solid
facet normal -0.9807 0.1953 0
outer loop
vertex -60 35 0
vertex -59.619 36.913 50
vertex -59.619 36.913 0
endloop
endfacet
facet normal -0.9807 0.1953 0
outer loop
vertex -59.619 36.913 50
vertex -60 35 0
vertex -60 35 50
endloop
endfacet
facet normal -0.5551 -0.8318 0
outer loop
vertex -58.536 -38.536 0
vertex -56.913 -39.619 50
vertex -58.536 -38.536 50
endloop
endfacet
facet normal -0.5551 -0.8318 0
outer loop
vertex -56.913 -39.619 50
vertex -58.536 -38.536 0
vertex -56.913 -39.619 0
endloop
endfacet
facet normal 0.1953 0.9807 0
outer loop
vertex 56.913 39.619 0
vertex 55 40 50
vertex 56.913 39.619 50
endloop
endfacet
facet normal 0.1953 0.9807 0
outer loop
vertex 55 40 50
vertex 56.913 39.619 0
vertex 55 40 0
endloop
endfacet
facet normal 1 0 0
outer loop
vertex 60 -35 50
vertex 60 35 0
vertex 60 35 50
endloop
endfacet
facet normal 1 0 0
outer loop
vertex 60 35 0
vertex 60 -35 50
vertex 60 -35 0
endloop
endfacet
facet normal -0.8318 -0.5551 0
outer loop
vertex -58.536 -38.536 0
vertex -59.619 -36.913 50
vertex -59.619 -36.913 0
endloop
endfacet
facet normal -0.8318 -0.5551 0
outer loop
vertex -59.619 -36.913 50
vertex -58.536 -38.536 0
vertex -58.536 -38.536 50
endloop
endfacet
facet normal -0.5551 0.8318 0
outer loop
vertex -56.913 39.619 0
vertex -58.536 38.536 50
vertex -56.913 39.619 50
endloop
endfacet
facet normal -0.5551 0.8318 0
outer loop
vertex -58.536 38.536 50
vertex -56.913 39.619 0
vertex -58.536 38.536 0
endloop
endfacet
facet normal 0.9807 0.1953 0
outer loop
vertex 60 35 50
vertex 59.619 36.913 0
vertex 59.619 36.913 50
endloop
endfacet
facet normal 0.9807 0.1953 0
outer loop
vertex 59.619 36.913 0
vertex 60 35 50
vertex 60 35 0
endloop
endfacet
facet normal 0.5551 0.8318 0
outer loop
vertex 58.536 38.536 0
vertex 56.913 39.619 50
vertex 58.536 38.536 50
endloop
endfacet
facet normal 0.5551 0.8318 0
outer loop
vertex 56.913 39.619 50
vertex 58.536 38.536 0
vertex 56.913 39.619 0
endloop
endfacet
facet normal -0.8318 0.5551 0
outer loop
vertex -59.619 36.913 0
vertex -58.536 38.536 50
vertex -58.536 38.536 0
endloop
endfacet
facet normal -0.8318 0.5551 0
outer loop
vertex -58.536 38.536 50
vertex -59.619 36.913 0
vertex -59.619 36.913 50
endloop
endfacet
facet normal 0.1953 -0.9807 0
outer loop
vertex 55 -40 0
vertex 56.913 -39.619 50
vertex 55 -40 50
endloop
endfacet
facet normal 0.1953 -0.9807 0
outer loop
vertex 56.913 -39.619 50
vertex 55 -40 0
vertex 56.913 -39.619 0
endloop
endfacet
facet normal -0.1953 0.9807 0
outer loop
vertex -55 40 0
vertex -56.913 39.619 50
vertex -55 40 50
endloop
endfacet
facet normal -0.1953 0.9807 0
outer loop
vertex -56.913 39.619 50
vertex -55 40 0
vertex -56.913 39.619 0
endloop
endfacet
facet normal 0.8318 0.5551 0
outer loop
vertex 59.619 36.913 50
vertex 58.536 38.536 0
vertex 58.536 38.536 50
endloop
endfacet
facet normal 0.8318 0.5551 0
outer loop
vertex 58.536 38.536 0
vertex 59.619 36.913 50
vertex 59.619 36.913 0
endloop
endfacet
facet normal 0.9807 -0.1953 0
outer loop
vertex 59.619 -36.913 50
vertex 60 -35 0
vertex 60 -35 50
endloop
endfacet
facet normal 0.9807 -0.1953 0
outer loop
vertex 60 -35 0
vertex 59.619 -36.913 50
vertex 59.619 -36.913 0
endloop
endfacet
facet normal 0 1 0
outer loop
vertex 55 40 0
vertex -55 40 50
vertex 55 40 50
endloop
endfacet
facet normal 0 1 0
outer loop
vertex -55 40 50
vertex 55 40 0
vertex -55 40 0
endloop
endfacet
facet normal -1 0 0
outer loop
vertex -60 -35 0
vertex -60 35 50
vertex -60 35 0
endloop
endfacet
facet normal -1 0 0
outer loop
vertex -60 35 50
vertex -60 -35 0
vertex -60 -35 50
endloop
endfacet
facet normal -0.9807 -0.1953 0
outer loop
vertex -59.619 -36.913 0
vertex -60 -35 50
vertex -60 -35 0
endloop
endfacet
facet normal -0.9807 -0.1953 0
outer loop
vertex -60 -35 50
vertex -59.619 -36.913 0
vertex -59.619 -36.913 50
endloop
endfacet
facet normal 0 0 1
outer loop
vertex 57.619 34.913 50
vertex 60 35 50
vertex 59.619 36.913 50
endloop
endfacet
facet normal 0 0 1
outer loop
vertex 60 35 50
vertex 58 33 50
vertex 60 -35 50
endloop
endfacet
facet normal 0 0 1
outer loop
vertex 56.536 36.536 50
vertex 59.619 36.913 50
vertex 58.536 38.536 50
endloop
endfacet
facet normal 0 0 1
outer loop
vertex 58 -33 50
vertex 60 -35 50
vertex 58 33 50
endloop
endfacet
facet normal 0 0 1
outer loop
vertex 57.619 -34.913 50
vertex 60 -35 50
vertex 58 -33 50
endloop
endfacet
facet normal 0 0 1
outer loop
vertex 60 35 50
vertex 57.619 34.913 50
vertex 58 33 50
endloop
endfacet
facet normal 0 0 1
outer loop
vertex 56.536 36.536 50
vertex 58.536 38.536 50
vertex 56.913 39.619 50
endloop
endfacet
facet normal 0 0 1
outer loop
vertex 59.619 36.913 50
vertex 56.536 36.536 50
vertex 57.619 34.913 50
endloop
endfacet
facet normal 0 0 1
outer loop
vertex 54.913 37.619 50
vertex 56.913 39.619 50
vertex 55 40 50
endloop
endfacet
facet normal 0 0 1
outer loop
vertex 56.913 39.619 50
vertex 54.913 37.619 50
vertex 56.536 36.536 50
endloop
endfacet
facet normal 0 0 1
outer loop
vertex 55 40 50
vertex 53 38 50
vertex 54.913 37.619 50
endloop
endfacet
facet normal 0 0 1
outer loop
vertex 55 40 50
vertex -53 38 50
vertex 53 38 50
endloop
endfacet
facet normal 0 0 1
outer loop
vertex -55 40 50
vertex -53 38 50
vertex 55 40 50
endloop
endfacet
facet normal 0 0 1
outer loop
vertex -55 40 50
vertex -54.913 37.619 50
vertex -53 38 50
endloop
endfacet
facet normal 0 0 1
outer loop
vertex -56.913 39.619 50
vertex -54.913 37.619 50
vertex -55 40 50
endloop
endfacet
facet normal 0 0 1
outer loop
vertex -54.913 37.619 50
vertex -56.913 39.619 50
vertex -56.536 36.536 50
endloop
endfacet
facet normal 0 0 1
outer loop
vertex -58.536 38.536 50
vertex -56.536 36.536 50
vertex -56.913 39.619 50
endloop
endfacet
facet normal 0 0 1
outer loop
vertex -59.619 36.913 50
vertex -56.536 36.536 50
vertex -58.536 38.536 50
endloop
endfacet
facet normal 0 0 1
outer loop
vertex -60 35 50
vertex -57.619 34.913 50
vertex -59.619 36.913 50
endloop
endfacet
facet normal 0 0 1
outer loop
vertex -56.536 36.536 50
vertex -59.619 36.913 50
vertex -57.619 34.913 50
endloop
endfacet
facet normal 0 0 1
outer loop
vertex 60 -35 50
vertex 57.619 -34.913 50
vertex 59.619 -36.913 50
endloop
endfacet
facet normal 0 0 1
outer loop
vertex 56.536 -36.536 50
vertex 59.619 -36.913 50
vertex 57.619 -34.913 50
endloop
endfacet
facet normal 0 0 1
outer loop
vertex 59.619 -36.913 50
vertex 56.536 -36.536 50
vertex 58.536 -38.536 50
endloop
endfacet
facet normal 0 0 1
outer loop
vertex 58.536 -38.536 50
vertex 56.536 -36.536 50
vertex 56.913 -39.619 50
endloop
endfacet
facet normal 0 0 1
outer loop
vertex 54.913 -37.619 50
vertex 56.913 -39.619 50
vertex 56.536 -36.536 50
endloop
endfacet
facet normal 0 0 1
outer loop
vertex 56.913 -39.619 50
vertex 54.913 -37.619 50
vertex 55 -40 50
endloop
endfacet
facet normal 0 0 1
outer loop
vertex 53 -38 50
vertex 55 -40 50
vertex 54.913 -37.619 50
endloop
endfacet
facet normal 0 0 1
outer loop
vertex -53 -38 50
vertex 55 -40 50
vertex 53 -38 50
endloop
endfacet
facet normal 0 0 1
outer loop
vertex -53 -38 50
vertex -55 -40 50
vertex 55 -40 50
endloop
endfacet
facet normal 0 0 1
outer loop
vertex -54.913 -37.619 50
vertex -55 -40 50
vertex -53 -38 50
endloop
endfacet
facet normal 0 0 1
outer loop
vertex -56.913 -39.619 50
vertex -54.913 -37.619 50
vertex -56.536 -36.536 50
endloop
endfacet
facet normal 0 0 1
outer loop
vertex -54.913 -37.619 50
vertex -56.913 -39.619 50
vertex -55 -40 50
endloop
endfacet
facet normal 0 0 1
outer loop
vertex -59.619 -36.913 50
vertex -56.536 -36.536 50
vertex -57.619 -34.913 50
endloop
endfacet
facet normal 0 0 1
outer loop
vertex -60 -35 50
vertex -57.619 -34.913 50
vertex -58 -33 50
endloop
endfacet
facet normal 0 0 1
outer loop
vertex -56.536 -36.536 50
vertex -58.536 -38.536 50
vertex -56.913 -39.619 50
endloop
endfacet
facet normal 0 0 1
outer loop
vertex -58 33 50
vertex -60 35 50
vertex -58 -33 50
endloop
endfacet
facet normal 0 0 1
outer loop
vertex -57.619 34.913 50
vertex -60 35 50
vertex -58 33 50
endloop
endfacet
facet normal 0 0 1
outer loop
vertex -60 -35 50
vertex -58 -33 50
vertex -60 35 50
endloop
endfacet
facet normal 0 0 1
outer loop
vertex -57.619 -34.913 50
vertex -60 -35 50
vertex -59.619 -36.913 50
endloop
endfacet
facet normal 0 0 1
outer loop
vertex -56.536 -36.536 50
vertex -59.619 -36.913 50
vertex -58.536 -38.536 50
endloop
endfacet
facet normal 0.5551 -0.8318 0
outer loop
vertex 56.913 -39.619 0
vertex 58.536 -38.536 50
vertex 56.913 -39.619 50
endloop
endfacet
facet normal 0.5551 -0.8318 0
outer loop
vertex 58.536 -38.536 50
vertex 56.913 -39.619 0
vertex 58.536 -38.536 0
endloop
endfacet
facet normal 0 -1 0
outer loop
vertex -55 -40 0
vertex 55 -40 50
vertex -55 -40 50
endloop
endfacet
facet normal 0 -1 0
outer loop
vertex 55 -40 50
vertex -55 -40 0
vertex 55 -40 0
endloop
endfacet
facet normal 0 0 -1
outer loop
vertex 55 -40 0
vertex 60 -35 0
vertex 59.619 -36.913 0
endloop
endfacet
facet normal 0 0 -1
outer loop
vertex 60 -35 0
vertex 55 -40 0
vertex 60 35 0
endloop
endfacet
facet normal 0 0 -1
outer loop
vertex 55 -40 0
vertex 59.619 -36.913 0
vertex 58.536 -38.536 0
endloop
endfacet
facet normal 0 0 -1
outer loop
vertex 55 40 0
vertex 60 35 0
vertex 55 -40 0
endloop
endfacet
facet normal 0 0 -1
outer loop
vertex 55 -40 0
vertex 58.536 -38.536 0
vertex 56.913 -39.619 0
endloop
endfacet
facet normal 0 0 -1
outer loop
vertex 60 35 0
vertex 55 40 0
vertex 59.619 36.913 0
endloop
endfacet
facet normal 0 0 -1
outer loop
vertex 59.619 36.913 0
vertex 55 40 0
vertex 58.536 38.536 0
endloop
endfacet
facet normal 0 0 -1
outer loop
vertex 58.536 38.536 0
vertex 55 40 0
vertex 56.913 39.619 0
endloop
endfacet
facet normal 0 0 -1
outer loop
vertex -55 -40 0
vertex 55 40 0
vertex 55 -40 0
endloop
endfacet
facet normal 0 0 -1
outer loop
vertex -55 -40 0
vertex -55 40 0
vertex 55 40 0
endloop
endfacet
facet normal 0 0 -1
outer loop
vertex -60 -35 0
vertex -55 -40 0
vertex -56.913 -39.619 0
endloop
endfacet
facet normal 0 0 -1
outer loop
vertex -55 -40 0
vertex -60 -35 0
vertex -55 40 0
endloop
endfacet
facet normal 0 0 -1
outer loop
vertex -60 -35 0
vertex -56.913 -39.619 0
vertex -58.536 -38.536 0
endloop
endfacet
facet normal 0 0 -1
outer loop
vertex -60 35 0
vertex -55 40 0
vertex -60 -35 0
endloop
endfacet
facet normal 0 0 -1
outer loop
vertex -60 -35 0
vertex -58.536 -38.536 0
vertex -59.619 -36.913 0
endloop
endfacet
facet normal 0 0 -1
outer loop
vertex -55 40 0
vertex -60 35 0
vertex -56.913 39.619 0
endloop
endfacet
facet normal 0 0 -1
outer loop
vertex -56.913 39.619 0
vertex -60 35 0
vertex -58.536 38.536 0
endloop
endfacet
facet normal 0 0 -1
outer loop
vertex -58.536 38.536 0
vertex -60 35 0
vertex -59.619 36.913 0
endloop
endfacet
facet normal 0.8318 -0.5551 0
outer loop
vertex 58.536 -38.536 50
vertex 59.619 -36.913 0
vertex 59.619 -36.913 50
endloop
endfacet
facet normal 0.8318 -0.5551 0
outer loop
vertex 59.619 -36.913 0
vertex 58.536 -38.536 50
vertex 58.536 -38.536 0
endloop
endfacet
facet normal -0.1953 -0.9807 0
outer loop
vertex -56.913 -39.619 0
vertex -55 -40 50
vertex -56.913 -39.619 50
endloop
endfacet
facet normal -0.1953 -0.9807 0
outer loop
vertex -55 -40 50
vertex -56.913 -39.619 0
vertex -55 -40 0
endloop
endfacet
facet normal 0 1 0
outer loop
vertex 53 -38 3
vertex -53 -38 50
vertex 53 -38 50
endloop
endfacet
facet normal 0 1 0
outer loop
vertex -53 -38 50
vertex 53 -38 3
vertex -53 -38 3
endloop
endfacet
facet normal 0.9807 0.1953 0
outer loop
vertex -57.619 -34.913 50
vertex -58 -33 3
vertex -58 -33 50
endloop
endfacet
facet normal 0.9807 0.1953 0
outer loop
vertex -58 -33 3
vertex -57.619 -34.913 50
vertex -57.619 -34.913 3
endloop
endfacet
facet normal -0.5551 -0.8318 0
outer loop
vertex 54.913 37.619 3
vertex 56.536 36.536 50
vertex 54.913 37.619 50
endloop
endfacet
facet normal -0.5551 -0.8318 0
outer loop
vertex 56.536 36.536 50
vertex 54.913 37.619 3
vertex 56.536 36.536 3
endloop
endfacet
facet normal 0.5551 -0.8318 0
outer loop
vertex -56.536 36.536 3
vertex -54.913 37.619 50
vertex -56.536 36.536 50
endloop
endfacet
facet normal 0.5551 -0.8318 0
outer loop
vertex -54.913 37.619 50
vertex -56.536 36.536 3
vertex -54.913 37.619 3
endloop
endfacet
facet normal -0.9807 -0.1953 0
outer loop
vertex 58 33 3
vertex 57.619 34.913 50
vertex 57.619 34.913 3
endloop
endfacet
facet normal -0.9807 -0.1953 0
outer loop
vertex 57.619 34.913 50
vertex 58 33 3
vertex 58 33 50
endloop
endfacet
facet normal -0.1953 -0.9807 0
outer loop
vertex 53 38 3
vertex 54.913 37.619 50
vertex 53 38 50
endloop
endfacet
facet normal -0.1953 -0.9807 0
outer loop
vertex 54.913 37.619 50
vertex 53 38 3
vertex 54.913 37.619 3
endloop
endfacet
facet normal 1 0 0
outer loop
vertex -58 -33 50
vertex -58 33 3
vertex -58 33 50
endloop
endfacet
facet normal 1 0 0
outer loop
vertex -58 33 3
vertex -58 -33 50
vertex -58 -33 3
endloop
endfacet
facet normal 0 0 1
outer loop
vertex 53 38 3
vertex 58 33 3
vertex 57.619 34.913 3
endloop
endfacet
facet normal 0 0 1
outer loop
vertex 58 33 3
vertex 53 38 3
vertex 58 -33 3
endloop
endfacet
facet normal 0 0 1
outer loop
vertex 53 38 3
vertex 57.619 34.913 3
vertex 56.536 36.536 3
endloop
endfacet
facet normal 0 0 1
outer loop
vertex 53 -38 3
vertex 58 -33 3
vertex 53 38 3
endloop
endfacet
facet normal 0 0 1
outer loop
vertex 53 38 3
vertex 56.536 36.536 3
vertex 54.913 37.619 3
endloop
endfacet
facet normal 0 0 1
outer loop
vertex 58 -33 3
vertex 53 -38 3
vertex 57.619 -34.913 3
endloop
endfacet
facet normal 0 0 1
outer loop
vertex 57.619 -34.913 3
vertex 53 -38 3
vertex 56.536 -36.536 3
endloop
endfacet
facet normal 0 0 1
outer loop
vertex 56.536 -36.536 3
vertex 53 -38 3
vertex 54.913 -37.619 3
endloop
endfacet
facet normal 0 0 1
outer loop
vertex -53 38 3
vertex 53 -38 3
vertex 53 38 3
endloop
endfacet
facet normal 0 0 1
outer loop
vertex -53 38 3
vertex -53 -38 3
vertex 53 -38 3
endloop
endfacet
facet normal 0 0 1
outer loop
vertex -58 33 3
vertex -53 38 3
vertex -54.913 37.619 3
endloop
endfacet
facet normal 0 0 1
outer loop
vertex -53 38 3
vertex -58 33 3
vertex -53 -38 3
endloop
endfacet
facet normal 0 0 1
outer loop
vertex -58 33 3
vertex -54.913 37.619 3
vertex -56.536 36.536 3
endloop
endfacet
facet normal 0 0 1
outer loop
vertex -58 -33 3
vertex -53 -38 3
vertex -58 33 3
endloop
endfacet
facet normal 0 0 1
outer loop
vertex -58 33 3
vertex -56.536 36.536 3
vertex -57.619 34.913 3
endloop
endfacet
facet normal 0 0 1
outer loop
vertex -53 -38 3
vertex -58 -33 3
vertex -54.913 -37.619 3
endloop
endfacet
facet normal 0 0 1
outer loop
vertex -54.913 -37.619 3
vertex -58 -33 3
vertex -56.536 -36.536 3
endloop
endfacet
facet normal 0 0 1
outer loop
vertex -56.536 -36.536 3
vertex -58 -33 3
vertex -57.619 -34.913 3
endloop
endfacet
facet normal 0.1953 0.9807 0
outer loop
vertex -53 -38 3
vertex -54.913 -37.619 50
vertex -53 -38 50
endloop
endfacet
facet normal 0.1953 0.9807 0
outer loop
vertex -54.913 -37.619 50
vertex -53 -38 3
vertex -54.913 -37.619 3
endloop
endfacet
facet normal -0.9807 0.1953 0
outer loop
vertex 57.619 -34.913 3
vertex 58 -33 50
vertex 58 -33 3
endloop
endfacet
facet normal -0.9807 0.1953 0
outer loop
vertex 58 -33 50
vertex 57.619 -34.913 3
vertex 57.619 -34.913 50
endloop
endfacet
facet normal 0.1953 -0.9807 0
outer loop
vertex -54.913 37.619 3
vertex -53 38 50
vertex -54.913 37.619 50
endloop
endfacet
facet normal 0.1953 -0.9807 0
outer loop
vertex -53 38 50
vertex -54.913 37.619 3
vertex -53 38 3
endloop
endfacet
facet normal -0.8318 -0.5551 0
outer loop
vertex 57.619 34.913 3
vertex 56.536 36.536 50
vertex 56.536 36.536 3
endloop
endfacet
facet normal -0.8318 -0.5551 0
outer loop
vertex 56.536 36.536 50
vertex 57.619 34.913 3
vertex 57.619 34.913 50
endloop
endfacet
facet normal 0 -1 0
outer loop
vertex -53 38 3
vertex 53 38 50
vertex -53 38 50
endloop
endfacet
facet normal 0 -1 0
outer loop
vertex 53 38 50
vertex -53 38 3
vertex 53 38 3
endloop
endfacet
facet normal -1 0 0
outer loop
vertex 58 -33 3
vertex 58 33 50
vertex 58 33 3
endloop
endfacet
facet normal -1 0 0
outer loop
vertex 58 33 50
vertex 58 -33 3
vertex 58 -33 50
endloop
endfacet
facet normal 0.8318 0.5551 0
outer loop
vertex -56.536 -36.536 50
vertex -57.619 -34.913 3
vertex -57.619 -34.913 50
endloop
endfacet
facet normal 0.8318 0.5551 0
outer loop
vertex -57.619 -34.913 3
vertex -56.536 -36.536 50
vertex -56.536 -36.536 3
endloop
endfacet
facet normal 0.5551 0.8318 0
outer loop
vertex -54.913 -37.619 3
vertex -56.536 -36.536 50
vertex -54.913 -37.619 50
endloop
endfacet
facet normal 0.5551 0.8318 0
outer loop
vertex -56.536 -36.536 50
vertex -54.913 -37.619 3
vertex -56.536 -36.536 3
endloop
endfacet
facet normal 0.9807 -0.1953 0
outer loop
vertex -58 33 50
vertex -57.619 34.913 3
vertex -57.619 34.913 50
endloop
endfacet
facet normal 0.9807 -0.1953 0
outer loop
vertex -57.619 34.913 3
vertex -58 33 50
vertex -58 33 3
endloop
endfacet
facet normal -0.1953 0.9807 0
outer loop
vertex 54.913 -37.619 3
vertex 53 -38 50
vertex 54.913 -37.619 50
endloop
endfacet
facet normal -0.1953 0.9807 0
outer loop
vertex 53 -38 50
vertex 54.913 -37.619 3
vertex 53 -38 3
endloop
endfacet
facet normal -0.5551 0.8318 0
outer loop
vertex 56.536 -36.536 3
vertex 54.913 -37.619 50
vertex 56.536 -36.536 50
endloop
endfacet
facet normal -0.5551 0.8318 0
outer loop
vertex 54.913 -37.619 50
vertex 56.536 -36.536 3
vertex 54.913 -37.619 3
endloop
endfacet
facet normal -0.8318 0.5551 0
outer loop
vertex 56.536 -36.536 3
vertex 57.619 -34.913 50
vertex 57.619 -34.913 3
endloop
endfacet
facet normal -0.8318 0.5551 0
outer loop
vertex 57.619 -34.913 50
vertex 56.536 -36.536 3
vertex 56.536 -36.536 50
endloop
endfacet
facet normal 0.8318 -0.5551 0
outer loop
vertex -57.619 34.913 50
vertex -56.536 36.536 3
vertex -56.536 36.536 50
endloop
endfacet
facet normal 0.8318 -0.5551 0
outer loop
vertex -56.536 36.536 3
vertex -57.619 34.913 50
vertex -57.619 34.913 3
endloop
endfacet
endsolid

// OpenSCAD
/*
 * Library:     RoundedBox.scad
 * Version:     1.0
 * Author:      Reinhard Loch
 * Copyright:   2024
 * License:     2-clause BSD License
 *              (http://opensource.org/licenses/BSD-2-Clause)
 */


/* [Box Dimensions] */

// Height
h = 50; // [10:200]

// Width
w = 120; // [10:250]

// Depth
d = 80; // [10:250]

// Radius
r = 5; // [1:10]


/* [Thickness] */

// Wall Thickness
wth = 2; // [1:10]

// Bottom Thickness
bth = 3; // [1:10]


module RoundedBox(h = h, w = w, d = d, r = r, wth = wth, bth = bth) {

translate([-w/2 + r, -d/2 + r, 0])

    difference() {
    
        minkowski() {
            cube([w - 2*r, d - 2*r, h/2]);
            cylinder(h = h/2, r = r);
        };
    
        translate([wth, wth, bth])

            minkowski() {
                cube([w - 2*r - 2*wth, d - 2*r - 2*wth, h/2]);
                cylinder(h = h/2, r = r);
            };

    };
    
};

RoundedBox();
